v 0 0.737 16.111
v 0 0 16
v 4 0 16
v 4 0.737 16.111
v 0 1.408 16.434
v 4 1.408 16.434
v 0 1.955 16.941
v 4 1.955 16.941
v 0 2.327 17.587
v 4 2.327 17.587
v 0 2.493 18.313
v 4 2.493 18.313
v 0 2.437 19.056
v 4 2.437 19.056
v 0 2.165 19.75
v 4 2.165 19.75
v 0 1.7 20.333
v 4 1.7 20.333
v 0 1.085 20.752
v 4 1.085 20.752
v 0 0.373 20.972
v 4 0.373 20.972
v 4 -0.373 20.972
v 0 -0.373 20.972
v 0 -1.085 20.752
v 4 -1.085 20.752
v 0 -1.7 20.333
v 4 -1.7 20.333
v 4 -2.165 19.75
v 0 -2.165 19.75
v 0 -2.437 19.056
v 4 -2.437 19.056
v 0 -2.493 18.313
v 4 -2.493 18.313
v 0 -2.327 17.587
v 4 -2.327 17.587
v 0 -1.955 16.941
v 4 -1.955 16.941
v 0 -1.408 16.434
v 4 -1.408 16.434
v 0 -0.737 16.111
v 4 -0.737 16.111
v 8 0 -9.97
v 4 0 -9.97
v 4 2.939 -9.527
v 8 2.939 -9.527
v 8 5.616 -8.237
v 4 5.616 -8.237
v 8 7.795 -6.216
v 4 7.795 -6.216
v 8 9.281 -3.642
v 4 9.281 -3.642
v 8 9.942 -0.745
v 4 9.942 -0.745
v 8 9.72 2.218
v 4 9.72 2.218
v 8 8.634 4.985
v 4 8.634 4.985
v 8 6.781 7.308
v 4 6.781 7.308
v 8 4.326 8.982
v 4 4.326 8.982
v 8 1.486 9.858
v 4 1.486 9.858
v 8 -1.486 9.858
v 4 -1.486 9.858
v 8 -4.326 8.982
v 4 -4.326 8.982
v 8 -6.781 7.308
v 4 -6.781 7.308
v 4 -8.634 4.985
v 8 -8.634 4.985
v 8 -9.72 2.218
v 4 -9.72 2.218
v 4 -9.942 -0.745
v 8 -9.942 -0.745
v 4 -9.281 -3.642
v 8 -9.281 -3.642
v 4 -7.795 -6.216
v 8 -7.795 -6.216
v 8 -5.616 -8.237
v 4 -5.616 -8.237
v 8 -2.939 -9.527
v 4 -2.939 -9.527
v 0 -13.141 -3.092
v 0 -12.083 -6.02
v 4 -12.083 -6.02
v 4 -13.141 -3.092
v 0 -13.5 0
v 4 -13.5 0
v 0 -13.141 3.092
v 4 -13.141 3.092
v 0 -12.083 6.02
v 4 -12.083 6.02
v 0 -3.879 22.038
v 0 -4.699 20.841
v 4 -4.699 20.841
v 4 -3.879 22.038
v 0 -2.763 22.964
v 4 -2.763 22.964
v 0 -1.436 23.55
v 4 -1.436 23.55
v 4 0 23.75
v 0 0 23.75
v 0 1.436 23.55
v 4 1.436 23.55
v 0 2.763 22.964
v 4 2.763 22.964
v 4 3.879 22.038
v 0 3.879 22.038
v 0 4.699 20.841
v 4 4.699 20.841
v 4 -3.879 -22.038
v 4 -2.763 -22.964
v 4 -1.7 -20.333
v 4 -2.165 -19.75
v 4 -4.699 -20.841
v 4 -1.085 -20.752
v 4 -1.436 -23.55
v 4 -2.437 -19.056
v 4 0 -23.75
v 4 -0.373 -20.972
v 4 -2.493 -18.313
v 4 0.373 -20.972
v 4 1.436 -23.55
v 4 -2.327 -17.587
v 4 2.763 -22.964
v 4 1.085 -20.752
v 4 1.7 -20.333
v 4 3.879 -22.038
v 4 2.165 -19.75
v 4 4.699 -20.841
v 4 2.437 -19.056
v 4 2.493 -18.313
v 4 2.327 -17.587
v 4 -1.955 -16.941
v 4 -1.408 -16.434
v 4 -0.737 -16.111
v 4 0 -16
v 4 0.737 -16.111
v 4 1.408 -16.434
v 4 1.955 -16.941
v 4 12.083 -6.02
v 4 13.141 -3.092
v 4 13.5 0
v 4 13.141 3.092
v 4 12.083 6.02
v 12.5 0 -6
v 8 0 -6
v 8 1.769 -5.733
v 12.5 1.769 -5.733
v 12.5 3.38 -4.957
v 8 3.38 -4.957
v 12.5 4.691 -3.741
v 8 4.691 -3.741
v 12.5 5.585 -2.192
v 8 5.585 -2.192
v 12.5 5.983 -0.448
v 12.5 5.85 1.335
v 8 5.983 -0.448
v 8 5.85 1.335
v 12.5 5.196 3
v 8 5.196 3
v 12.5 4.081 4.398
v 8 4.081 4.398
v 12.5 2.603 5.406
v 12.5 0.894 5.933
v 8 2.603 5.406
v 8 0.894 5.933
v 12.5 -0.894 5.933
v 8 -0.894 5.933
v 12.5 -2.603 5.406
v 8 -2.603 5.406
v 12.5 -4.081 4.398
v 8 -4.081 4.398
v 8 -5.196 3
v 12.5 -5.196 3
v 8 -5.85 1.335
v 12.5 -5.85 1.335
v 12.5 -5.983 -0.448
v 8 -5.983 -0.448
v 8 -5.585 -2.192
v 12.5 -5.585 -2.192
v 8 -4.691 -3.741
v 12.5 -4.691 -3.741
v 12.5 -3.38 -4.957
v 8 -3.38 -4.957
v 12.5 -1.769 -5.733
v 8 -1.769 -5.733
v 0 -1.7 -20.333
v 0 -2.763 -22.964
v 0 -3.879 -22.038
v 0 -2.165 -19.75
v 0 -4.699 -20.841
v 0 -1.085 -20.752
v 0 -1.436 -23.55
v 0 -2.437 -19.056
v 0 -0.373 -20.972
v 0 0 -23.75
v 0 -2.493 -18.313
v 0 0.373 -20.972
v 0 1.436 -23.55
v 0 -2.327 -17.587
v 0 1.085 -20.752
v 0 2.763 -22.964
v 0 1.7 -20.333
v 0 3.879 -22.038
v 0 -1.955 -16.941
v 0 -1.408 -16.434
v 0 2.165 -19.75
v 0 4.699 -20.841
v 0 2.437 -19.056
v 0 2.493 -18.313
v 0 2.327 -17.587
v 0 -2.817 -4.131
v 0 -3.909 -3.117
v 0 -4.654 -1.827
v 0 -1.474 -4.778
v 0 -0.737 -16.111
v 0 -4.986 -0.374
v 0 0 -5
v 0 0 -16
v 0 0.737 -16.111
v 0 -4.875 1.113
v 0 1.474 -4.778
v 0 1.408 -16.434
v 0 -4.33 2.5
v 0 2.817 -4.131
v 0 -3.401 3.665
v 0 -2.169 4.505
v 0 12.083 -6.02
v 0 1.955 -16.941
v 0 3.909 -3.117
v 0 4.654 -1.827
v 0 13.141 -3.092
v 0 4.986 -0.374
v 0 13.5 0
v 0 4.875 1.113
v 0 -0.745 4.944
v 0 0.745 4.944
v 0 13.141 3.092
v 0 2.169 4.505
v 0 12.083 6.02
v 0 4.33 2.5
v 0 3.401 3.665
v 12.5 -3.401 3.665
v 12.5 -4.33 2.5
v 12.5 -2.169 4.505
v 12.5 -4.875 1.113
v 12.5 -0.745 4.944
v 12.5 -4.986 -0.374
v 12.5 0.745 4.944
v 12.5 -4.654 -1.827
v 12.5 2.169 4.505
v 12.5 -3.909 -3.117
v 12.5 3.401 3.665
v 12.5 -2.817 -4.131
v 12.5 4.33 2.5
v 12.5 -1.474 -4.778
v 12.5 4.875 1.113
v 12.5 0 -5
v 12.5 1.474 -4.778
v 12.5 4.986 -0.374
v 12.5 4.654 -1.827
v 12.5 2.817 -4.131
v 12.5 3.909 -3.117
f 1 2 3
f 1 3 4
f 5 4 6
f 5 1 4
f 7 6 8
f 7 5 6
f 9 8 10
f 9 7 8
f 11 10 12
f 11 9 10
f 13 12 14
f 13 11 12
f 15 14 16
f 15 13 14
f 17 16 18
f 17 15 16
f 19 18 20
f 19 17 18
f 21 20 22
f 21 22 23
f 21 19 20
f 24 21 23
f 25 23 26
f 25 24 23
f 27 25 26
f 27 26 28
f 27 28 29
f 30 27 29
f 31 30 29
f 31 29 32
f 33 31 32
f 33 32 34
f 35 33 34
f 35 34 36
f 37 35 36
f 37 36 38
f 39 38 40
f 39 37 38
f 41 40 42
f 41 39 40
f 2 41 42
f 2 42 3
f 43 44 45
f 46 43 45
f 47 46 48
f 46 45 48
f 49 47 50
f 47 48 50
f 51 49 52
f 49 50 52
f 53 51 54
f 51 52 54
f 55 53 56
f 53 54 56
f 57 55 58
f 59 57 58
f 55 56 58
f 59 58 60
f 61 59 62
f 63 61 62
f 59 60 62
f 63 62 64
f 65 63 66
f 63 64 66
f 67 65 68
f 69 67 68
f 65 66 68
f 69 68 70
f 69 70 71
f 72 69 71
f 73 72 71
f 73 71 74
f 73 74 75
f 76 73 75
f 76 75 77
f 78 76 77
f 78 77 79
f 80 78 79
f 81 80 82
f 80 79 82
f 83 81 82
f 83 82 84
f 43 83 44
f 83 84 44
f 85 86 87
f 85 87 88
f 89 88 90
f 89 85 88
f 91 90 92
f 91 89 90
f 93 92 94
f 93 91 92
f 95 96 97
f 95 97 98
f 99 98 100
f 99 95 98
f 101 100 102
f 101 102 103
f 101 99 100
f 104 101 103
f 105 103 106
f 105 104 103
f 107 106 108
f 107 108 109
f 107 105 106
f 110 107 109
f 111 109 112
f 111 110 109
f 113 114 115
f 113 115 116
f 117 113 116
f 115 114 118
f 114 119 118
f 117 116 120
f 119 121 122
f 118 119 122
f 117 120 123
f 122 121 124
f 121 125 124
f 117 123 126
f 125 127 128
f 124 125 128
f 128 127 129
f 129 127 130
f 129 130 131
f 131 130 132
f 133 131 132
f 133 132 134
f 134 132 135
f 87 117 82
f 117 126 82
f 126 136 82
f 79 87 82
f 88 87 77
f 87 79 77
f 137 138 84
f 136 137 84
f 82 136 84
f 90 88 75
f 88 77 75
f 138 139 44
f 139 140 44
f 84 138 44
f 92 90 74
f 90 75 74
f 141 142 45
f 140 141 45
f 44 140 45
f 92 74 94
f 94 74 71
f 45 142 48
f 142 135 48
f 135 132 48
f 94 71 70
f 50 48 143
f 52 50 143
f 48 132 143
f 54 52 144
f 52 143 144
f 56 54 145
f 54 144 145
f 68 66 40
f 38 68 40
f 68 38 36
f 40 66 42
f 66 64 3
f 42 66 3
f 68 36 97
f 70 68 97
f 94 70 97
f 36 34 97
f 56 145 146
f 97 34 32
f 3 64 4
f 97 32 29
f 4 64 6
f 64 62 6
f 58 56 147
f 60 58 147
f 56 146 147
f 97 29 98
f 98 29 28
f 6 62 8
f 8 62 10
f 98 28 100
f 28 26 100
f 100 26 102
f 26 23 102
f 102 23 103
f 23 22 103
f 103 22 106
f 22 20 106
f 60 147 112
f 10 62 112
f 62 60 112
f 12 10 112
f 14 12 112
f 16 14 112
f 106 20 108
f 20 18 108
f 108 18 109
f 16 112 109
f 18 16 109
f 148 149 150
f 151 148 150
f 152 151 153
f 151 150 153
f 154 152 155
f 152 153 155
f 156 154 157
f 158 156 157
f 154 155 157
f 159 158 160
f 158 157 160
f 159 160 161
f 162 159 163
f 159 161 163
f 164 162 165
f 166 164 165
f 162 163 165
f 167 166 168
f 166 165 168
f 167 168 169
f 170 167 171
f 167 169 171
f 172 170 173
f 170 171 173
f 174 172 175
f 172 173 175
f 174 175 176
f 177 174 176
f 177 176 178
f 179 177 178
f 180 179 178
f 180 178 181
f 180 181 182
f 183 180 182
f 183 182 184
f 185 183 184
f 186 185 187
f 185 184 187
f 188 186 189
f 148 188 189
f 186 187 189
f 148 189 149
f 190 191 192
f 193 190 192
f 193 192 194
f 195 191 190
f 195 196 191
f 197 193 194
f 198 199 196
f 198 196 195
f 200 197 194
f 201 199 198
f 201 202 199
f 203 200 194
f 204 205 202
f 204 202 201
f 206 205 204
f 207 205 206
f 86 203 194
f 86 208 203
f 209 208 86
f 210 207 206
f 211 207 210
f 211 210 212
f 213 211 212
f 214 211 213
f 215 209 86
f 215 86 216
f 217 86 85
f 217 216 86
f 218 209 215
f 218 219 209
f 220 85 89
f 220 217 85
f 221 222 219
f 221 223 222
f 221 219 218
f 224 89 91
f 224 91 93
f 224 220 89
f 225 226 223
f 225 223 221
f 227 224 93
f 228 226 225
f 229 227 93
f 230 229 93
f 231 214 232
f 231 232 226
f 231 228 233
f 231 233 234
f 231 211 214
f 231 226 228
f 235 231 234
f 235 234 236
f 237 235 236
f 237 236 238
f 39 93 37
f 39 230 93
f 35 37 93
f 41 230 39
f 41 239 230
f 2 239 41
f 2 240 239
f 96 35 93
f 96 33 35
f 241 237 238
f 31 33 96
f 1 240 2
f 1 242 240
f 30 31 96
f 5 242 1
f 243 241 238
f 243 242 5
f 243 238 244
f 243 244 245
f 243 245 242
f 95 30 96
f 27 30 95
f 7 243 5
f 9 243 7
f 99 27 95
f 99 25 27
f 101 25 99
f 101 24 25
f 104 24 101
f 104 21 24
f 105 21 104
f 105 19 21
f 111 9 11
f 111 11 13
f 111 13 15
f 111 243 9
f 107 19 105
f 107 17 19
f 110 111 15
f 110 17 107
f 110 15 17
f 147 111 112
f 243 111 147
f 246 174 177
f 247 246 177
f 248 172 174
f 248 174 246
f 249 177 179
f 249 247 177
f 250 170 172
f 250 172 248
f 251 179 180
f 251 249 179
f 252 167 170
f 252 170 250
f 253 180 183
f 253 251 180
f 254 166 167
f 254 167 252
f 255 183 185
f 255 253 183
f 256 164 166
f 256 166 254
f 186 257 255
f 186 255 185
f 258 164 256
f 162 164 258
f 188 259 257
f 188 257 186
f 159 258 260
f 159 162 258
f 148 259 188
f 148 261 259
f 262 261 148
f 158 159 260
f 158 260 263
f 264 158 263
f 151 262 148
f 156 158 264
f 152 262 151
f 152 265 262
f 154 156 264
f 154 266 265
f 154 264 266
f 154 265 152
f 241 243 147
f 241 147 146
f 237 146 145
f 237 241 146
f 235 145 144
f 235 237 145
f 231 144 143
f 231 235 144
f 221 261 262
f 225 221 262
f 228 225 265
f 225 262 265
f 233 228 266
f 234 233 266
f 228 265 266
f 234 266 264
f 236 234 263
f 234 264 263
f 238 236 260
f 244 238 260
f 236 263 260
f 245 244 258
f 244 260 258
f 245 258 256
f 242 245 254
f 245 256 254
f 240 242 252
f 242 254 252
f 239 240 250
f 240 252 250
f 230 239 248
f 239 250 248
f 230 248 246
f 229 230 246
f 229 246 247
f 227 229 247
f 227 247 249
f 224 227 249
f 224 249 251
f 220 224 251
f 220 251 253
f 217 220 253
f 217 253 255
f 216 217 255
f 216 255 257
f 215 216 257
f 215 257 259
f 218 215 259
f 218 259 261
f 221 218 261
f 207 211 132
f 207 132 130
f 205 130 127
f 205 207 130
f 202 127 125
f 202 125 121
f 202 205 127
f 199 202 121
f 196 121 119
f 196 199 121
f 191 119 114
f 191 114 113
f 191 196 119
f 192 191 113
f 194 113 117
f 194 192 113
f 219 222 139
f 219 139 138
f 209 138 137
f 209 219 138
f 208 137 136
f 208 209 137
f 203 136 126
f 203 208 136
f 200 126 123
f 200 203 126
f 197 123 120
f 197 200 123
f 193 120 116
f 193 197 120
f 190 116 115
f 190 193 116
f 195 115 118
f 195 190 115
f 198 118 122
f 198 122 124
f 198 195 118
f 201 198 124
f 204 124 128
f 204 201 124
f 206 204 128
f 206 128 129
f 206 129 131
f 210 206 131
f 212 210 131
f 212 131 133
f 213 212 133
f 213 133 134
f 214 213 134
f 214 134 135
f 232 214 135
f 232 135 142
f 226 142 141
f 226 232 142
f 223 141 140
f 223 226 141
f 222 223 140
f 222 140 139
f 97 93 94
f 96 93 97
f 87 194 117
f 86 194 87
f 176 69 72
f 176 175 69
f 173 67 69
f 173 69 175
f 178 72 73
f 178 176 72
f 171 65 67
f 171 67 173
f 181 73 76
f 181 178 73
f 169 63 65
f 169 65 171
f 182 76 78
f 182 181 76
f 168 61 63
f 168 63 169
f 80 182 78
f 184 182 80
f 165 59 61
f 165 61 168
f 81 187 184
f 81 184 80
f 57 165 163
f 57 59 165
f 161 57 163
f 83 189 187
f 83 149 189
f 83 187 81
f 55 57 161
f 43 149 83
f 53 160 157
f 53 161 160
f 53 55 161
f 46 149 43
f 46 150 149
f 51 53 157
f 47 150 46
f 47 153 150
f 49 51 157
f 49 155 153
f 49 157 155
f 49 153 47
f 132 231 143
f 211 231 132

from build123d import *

# Parameters (mm, degrees)
SKETCH1_R           = 2.5
BOSS_EXTRUDE1_DEPTH = 4
SKETCH2_R           = 9.969747688
BOSS_EXTRUDE2_DEPTH = 4
SKETCH3_R           = 6
BOSS_EXTRUDE3_DEPTH = 4.5
SKETCH4_R           = 5
CUT_EXTRUDE1_DEPTH  = 31.042677977


with BuildPart() as part:
    # Sketch1 → Boss-Extrude1 (new body)
    with BuildSketch(Plane(origin=(0, 0, 0), x_dir=(0, 0, -1), z_dir=(1, 0, 0))):
        with BuildLine():
            Line((-20.841216216, 4.699064442), (-6.02027027, 12.083308565))
            ThreePointArc((-6.02027027, 12.083308565), (0, 13.5), (6.02027027, 12.083308565))
            Line((6.02027027, 12.083308565), (20.841216216, 4.699064442))
            ThreePointArc((20.841216216, 4.699064442), (23.75, 0), (20.841216216, -4.699064442))
            Line((20.841216216, -4.699064442), (6.02027027, -12.083308565))
            ThreePointArc((6.02027027, -12.083308565), (0, -13.5), (-6.02027027, -12.083308565))
            Line((-6.02027027, -12.083308565), (-20.841216216, -4.699064442))
            ThreePointArc((-20.841216216, -4.699064442), (-23.75, 0), (-20.841216216, 4.699064442))
        make_face()
        with Locations((-18.5, 0)):
            Circle(SKETCH1_R, mode=Mode.SUBTRACT)
        with Locations(Location((18.5, 0, 0), (0, 0, 180))):
            Circle(SKETCH1_R, mode=Mode.SUBTRACT)
    extrude(amount=BOSS_EXTRUDE1_DEPTH)

    # Sketch2 → Boss-Extrude2 (add)
    with BuildSketch(Plane(origin=(4, 0, 0), x_dir=(0, 0, -1), z_dir=(1, 0, 0))):
        Circle(SKETCH2_R)
    extrude(amount=BOSS_EXTRUDE2_DEPTH)

    # Sketch3 → Boss-Extrude3 (add)
    with BuildSketch(Plane(origin=(8, 0, 0), x_dir=(0, 0, -1), z_dir=(1, 0, 0))):
        Circle(SKETCH3_R)
    extrude(amount=BOSS_EXTRUDE3_DEPTH)

    # Sketch4 → Cut-Extrude1 (cut, through all)
    with BuildSketch(Plane(origin=(12.5, 0, 0), x_dir=(0, 0, -1), z_dir=(1, 0, 0))):
        Circle(SKETCH4_R)
    extrude(amount=-CUT_EXTRUDE1_DEPTH, mode=Mode.SUBTRACT)


solid = part.part
